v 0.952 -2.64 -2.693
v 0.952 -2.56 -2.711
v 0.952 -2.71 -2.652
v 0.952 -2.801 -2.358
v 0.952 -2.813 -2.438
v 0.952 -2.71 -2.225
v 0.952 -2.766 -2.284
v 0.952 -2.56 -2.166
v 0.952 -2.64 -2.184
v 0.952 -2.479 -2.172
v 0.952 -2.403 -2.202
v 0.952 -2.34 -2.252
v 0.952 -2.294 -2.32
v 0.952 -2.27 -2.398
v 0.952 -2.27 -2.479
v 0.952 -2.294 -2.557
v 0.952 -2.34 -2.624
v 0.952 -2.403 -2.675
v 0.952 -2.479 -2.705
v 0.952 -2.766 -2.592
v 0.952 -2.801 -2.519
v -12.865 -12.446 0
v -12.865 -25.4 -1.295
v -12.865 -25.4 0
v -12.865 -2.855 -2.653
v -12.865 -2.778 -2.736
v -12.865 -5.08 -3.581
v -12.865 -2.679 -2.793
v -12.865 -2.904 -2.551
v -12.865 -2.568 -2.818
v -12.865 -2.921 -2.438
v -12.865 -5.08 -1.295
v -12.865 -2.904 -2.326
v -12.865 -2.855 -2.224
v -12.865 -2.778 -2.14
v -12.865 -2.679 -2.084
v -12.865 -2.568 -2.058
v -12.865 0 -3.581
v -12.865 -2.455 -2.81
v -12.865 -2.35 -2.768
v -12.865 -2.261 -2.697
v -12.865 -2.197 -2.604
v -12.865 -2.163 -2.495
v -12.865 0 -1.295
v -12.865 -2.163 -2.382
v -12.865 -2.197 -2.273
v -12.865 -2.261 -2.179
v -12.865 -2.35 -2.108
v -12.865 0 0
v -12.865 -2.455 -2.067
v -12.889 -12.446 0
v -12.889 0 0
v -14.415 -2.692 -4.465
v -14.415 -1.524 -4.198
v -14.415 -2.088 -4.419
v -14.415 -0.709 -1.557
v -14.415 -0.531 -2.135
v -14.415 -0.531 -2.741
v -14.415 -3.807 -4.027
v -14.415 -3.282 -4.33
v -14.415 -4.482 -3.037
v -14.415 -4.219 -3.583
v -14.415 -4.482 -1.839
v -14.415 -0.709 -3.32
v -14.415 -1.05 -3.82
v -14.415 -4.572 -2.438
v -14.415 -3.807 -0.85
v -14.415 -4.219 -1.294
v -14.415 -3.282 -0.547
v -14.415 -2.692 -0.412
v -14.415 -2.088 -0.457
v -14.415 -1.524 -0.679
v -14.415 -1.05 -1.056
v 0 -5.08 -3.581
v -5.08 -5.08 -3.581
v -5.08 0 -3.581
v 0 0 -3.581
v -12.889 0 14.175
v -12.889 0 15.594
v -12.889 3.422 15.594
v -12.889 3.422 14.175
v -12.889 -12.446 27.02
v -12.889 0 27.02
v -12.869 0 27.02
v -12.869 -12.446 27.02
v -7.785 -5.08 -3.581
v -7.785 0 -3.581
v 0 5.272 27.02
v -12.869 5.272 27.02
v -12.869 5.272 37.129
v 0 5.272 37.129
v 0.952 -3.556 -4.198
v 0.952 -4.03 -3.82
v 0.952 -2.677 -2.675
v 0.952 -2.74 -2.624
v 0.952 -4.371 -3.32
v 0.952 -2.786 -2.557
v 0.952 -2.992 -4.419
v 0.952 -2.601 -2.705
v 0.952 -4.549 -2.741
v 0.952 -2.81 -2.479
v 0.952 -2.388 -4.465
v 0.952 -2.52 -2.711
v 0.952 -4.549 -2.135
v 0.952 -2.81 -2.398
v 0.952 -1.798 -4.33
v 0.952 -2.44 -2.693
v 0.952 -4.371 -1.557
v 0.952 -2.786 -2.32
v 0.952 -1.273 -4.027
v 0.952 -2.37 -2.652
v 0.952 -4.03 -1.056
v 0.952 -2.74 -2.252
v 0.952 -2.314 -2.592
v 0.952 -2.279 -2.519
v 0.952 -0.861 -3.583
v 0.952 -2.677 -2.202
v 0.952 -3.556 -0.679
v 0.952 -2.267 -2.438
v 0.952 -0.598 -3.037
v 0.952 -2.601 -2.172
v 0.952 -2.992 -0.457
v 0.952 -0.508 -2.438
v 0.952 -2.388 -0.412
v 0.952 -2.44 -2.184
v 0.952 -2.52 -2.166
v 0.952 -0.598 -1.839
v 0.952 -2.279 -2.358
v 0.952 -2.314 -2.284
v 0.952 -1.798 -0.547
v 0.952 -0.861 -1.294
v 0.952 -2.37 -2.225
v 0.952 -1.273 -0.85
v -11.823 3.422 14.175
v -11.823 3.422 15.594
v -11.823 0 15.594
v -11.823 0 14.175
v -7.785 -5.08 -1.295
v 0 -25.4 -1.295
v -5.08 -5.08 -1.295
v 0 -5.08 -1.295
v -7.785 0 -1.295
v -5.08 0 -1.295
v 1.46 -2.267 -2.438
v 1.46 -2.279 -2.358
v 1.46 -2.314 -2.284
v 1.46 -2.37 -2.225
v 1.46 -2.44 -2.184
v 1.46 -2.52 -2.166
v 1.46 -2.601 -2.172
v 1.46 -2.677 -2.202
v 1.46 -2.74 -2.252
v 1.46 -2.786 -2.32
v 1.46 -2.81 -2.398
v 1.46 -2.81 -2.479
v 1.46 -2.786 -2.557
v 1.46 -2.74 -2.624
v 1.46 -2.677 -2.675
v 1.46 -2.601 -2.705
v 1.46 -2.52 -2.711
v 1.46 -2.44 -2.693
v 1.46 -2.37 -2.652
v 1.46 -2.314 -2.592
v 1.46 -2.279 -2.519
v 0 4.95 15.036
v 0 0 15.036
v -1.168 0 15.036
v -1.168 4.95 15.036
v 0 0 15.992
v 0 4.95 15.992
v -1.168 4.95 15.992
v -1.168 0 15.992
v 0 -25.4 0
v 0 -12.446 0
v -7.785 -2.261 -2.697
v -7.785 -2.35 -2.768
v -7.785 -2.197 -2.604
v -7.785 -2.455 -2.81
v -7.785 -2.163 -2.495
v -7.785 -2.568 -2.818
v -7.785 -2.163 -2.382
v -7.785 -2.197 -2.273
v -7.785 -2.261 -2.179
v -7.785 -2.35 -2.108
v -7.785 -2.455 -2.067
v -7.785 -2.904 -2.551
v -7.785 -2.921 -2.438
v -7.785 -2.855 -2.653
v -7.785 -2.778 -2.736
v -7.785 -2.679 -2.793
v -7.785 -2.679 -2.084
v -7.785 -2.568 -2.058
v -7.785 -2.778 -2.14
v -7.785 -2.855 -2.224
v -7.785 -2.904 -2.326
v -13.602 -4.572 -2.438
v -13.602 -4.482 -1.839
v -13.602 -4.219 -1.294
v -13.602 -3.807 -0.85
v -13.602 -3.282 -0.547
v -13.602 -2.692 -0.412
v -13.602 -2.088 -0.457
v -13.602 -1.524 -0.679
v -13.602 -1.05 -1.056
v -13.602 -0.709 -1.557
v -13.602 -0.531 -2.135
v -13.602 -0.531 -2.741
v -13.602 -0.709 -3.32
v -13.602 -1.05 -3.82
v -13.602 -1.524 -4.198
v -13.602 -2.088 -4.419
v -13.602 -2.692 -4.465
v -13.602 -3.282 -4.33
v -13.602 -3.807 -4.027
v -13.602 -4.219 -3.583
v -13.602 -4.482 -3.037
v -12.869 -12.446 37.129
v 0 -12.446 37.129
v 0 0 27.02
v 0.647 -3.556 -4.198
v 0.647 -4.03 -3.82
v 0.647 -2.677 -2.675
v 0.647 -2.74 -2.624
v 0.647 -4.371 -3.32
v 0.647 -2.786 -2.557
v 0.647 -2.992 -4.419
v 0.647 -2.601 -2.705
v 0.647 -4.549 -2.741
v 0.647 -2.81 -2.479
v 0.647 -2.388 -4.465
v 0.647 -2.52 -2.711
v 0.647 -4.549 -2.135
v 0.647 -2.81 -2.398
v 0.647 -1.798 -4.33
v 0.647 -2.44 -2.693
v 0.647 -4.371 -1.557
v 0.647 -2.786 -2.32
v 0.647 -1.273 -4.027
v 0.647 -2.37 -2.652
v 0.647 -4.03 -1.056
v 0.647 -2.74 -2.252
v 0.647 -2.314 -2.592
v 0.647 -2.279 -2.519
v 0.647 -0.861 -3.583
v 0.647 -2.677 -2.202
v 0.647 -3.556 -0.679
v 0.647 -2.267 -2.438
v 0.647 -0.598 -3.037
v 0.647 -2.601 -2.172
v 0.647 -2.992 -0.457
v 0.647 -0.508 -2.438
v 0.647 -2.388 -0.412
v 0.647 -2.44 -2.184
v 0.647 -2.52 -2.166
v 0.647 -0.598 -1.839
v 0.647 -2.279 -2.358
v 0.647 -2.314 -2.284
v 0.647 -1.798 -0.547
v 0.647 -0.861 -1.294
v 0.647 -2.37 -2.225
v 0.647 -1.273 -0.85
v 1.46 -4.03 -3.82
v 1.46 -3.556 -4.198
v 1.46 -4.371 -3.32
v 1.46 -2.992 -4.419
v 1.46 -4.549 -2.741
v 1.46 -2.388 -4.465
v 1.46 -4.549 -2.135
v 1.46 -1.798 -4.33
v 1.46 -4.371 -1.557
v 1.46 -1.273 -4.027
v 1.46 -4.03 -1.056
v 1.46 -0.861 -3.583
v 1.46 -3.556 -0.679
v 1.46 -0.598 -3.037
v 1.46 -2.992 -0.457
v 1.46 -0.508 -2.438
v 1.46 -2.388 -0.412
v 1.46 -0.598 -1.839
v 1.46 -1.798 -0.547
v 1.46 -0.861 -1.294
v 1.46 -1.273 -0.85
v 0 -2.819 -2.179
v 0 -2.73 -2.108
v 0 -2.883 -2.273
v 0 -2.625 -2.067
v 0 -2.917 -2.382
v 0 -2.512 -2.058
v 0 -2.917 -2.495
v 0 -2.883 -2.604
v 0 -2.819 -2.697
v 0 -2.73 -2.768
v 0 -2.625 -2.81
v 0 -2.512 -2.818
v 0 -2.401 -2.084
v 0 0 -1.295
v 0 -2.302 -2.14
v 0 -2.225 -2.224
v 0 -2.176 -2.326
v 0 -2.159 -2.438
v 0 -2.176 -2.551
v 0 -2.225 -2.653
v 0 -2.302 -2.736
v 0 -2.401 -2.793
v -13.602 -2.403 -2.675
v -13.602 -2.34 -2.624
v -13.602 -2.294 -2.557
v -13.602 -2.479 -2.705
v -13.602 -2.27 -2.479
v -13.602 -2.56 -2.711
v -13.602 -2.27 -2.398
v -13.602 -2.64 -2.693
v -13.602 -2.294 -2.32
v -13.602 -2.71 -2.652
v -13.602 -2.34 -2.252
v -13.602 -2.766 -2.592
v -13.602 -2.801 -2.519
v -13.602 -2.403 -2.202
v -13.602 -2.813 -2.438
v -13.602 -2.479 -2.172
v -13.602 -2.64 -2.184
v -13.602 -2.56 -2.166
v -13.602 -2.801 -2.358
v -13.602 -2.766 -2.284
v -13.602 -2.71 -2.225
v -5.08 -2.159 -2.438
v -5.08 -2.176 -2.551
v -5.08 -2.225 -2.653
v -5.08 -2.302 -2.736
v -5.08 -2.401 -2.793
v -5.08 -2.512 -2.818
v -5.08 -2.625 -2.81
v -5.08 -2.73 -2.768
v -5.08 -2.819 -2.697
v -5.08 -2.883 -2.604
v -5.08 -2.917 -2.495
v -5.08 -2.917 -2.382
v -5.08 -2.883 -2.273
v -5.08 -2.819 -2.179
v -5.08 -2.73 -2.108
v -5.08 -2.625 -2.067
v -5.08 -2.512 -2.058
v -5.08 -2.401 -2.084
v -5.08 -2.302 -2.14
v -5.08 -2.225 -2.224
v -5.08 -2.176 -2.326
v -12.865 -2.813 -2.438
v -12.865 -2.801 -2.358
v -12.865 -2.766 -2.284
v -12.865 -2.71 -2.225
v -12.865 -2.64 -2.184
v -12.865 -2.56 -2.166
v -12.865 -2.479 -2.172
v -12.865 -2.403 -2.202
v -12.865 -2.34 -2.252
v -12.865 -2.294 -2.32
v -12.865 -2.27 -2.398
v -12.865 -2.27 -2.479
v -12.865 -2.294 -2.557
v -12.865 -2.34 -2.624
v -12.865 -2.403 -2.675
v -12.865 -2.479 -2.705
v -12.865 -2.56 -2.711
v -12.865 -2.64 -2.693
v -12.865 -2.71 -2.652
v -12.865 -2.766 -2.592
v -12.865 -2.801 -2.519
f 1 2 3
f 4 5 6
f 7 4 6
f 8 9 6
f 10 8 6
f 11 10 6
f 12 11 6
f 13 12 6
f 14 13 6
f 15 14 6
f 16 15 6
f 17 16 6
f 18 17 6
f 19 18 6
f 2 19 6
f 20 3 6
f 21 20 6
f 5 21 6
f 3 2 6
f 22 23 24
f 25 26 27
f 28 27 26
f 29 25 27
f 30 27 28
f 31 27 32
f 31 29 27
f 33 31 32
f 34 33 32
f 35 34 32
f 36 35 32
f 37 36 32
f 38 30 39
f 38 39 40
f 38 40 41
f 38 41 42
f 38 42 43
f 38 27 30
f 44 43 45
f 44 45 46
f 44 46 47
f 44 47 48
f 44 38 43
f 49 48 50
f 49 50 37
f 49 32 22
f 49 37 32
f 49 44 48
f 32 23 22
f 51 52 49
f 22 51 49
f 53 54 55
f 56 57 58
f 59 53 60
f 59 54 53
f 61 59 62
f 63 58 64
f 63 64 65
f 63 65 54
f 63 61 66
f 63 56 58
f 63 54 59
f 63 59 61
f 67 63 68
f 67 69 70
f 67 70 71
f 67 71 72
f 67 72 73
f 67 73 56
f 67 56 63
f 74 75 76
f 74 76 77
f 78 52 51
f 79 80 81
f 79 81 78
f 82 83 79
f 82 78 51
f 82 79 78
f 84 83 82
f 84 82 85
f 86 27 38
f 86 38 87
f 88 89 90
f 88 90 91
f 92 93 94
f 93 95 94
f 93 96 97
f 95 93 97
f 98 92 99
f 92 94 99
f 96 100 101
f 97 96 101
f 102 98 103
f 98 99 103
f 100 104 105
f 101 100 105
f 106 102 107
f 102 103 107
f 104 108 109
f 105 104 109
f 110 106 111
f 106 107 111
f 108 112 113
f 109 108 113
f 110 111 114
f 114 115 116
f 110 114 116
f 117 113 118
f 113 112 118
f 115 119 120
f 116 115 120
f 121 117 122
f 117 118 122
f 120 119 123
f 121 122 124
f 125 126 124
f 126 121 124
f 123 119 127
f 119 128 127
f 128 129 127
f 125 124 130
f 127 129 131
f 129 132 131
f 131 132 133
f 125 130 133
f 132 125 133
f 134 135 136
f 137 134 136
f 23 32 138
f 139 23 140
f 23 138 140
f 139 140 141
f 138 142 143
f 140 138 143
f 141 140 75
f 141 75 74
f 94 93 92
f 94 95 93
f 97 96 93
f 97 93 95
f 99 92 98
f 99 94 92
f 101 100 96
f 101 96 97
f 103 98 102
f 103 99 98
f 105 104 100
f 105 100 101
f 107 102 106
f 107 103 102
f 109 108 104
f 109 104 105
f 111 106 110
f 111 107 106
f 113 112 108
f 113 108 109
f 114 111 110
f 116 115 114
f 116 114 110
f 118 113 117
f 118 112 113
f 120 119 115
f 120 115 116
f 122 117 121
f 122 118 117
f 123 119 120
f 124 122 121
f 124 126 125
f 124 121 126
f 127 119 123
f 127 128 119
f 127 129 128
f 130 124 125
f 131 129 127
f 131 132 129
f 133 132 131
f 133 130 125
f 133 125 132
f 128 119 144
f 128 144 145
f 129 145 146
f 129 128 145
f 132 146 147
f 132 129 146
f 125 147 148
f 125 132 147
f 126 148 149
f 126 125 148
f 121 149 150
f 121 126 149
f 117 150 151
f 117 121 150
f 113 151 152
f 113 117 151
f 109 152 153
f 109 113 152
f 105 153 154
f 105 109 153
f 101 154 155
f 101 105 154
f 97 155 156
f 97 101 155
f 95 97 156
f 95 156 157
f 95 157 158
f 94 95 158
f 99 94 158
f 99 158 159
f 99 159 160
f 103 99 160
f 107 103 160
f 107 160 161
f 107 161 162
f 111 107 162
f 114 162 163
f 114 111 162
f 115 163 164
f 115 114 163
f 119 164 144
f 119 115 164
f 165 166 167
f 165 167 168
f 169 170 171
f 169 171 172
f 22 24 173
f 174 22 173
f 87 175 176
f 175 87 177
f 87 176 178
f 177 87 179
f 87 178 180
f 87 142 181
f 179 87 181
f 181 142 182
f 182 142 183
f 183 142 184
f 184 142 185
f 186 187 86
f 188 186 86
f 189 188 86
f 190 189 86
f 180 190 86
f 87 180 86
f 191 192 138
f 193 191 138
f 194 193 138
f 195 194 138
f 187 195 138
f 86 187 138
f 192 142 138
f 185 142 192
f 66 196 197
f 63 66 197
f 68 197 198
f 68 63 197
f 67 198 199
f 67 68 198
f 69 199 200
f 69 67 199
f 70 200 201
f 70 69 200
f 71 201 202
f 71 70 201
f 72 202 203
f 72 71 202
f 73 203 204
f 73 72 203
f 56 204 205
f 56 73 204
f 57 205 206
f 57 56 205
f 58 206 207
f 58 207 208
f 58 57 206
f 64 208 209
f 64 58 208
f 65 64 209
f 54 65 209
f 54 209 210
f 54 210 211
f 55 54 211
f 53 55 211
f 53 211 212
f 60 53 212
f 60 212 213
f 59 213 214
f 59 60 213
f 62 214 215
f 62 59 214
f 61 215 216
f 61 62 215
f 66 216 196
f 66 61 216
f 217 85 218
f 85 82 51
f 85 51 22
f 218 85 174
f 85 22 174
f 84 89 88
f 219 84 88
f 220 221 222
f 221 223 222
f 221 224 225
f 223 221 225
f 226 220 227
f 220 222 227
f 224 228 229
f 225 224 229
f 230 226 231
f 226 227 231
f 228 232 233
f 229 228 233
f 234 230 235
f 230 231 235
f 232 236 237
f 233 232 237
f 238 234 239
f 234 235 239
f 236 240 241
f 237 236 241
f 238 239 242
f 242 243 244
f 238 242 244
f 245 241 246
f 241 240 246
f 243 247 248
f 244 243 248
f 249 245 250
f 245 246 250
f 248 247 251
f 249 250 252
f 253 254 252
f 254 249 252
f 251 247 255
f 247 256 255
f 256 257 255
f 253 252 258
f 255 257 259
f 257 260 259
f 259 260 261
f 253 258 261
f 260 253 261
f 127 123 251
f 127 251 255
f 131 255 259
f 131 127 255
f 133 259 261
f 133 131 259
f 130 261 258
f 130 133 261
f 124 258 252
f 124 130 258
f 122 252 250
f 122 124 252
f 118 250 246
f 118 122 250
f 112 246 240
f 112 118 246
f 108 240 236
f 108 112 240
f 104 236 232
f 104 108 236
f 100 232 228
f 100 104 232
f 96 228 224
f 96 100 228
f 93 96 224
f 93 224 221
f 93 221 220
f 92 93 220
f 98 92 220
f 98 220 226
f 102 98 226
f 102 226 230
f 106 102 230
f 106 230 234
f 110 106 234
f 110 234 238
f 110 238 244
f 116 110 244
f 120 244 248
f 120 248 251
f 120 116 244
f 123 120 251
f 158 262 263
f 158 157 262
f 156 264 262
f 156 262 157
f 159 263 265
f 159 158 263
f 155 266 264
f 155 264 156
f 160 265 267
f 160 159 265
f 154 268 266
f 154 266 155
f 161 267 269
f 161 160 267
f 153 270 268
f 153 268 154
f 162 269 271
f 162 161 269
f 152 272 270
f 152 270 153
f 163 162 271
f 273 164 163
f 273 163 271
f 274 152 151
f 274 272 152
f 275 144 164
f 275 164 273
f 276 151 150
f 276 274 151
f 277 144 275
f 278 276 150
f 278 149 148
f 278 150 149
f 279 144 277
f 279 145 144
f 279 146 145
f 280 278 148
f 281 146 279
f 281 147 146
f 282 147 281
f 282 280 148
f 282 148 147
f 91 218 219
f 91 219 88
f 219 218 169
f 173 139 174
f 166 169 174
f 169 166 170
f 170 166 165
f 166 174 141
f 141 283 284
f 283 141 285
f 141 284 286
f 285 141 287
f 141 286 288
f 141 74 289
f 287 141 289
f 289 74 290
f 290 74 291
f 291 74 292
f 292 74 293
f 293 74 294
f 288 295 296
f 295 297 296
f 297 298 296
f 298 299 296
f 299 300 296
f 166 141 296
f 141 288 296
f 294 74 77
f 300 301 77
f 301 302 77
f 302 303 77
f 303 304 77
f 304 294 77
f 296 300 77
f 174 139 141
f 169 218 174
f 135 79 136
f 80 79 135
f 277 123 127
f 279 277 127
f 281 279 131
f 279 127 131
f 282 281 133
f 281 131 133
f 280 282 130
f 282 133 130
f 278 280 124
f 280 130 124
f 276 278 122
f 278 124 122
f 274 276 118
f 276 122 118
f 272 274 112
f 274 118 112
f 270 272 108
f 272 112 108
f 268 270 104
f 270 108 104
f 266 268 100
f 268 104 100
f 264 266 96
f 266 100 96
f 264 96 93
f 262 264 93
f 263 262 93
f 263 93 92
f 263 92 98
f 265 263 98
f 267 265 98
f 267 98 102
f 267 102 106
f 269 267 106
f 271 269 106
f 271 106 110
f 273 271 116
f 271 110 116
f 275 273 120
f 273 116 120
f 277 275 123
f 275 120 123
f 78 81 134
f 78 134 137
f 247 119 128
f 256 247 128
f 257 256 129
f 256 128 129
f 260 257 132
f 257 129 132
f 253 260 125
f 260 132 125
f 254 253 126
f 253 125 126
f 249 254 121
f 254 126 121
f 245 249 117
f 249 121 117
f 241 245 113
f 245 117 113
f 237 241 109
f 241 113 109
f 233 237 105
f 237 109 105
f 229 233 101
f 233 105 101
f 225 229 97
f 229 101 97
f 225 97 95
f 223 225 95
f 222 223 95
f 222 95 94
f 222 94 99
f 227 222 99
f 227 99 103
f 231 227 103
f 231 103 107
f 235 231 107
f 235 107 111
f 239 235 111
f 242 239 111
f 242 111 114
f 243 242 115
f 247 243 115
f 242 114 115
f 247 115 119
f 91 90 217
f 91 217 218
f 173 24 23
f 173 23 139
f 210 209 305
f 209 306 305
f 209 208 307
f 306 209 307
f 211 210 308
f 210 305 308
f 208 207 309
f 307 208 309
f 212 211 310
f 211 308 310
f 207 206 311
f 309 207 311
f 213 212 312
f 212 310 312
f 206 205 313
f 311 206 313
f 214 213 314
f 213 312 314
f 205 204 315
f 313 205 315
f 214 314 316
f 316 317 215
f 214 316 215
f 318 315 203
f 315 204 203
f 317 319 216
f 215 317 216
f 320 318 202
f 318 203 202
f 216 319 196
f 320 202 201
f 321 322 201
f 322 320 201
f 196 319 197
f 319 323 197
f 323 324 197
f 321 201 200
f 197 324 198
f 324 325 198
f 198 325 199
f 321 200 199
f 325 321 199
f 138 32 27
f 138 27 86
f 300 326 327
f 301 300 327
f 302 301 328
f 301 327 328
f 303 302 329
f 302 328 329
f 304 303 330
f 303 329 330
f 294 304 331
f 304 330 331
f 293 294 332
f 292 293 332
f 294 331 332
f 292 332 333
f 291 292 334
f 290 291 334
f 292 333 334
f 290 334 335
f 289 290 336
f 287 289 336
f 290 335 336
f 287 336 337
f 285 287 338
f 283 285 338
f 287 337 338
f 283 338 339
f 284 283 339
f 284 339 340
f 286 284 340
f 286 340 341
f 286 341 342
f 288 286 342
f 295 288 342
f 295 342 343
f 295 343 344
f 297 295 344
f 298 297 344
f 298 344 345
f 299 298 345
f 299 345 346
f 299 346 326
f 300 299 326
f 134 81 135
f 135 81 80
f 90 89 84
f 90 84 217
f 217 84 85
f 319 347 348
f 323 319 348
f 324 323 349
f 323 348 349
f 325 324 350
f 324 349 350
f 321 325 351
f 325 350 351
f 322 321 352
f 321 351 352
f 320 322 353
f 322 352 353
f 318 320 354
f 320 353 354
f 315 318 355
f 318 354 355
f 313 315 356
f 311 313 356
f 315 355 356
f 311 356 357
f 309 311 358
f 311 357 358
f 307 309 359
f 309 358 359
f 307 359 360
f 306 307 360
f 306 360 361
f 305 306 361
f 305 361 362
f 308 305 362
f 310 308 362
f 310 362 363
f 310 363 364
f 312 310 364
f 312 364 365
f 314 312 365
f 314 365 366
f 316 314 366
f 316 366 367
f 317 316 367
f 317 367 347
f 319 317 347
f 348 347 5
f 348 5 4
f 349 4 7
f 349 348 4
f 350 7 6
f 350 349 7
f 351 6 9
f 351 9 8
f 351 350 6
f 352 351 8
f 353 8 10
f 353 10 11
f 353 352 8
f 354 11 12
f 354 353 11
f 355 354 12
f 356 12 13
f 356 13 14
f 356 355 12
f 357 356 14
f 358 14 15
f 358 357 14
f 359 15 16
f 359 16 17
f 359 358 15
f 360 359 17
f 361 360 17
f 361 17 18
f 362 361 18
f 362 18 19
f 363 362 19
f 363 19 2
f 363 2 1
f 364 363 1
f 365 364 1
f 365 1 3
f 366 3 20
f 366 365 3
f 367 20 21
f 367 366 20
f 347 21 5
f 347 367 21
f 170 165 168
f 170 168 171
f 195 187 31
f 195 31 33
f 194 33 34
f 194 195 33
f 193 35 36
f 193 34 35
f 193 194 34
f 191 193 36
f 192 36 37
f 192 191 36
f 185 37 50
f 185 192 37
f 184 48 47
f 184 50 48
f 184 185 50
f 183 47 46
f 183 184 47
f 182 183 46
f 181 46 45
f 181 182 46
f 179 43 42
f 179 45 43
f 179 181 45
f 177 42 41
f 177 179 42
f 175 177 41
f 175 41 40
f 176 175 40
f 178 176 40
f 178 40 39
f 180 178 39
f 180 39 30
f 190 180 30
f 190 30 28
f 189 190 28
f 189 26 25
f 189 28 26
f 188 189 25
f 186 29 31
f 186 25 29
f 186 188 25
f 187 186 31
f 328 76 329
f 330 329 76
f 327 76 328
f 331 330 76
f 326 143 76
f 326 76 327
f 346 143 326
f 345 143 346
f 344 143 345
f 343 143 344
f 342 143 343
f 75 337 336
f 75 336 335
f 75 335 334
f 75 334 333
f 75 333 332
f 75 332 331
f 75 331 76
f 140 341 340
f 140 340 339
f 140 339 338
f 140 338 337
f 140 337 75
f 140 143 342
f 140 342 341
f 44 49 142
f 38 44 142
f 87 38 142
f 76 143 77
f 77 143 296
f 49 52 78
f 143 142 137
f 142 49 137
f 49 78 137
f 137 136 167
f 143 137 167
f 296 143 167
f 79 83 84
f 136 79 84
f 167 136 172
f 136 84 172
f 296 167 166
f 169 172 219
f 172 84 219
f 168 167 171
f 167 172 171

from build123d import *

# Parameters (mm, degrees)
F0_W      = 12.8894392401
F0_H      = 27.0200837404
F1_DEPTH  = 12.446
F2_W      = 12.8653319553
F2_H      = 1.2952884426
F3_DEPTH  = 25.4
F4_W      = 5.08
F4_H      = 5.08
F5_DEPTH  = 2.286
F7_DEPTH  = 25.4
F8_DEPTH  = 16.129
F9_R      = 0.2734183719
F10_DEPTH = 13.8176
F11_DEPTH = 1.0414
F12_R     = 2.032
F12_R_2   = 0.2734183719
F13_DEPTH = 0.508
F14_DEPTH = 0.3048
F15_W     = 3.4224744886
F15_H     = 1.4192797244
F15_W_2   = 1.3463029172
F16_DEPTH = 1.0668
F17_W     = 4.9497946166
F17_H     = 0.95630344
F17_W_2   = 1.7731732223
F18_DEPTH = 1.1684
F19_W     = 12.8693562001
F19_H     = 5.2719768137
F19_H_2   = 12.446
F20_DEPTH = 10.1092
F21_R     = 2.032
F22_DEPTH = 0.508
F23_DEPTH = 0.3048


with BuildPart() as f1:
    # F0 (on Front) → F1 (new body)
    with BuildSketch(Plane.XZ):
        with Locations((-6.44471962, 13.5100418702)):
            Rectangle(F0_W, F0_H)
    extrude(amount=F1_DEPTH)

    # F2 (on Front) → F3 (join)
    with BuildSketch(Plane.XZ):
        with Locations((-6.4326659776, -0.6476442213)):
            Rectangle(F2_W, F2_H)
    extrude(amount=F3_DEPTH)

    # F4 (on face) → F5 (join)
    with BuildSketch(Plane(origin=(0, 0, -1.2952884426), x_dir=(1, 0, 0), z_dir=(0, 0, -1))):
        with Locations((-2.54, 2.54)):
            Rectangle(F4_W, F4_H)
        with Locations((-10.3253319553, 2.54)):
            Rectangle(F4_W, F4_H)
    extrude(amount=F5_DEPTH)

    # F6 (on face) → F7 (cut)
    with BuildSketch(Plane(origin=(-5.08, 0, 0), x_dir=(0, -1, 0), z_dir=(-1, 0, 0))):
        with BuildLine():
            Line((2.159, -2.4382884426), (2.921, -2.4382884426))
            ThreePointArc((2.921, -2.4382884426), (2.54, -2.0572884426), (2.159, -2.4382884426))
        make_face()
        with BuildLine():
            ThreePointArc((2.159, -2.4382884426), (2.54, -2.8192884426), (2.921, -2.4382884426))
            Line((2.921, -2.4382884426), (2.159, -2.4382884426))
        make_face()
    extrude(amount=-F7_DEPTH, mode=Mode.SUBTRACT)

    # F6 (on face) → F8 (cut)
    with BuildSketch(Plane(origin=(-5.08, 0, 0), x_dir=(0, -1, 0), z_dir=(-1, 0, 0))):
        with BuildLine():
            ThreePointArc((2.159, -2.4382884426), (2.54, -2.8192884426), (2.921, -2.4382884426))
            Line((2.921, -2.4382884426), (2.159, -2.4382884426))
        make_face()
        with BuildLine():
            Line((2.159, -2.4382884426), (2.921, -2.4382884426))
            ThreePointArc((2.921, -2.4382884426), (2.54, -2.0572884426), (2.159, -2.4382884426))
        make_face()
    extrude(amount=F8_DEPTH, mode=Mode.SUBTRACT)

    # F15 (on face) → F16 (join)
    with BuildSketch(Plane(origin=(-12.8894392401, 0, 0), x_dir=(0, -1, 0), z_dir=(-1, 0, 0))):
        with Locations((-1.7112372443, 14.8844057694)):
            Rectangle(F15_W, F15_H)
        with Locations((0.6731514586, 14.8844057694)):
            Rectangle(F15_W_2, F15_H)
    extrude(amount=-F16_DEPTH)

    # F17 (on face) → F18 (join)
    with BuildSketch(Plane.YZ):
        with Locations((2.4748973083, 15.5142215081)):
            Rectangle(F17_W, F17_H)
        with Locations((-0.8865866112, 15.5142215081)):
            Rectangle(F17_W_2, F17_H)
    extrude(amount=-F18_DEPTH)

    # F19 (on face) → F20 (join)
    with BuildSketch(Plane.XY.offset(27.0200837404)):
        with Locations((-6.4346781, 2.6359884068)):
            Rectangle(F19_W, F19_H)
        with Locations((-6.4346781, -6.223)):
            Rectangle(F19_W, F19_H_2)
    extrude(amount=F20_DEPTH)


with BuildPart() as f10:
    # F9 (on face) → F10 (new body)
    with BuildSketch(Plane(origin=(-12.8653319553, 0, 0), x_dir=(0, -1, 0), z_dir=(-1, 0, 0))):
        with Locations((2.54, -2.4382884426)):
            Circle(F9_R)
    extrude(amount=-F10_DEPTH)

    # F9 (on face) → F11 (join)
    with BuildSketch(Plane(origin=(-12.8653319553, 0, 0), x_dir=(0, -1, 0), z_dir=(-1, 0, 0))):
        with Locations((2.54, -2.4382884426)):
            Circle(F9_R)
    extrude(amount=F11_DEPTH)

    # F21 (on face) → F22 (join)
    with BuildSketch(Plane(origin=(-13.9067319553, 0, 0), x_dir=(0, -1, 0), z_dir=(-1, 0, 0))):
        with Locations((2.54, -2.4382884426)):
            Circle(F21_R)
    extrude(amount=F22_DEPTH)

    # F23 (add): a face of the model
    f23_faces = [f10.faces().sort_by_distance(p)[0] for p in [
        (-13.9067319553, -0.5654736392, -2.4382884426),
    ]]
    extrude(f23_faces, amount=F23_DEPTH)


with BuildPart() as f13:
    # F12 (on face) → F13 (new body)
    with BuildSketch(Plane.YZ.offset(0.9522680447)):
        with Locations((-2.54, -2.4382884426)):
            Circle(F12_R)
        with Locations((-2.54, -2.4382884426)):
            Circle(F12_R_2, mode=Mode.SUBTRACT)
    extrude(amount=F13_DEPTH)


with BuildPart() as f14:
    # F14 (new): a face of the model
    f14_faces = [f13.part.faces().sort_by_distance(p)[0] for p in [
        (0.9522680447, -4.5145263608, -2.4382884426),
    ]]
    extrude(f14_faces, amount=F14_DEPTH)


solid = Compound([f1.part, f10.part, f13.part, f14.part])
